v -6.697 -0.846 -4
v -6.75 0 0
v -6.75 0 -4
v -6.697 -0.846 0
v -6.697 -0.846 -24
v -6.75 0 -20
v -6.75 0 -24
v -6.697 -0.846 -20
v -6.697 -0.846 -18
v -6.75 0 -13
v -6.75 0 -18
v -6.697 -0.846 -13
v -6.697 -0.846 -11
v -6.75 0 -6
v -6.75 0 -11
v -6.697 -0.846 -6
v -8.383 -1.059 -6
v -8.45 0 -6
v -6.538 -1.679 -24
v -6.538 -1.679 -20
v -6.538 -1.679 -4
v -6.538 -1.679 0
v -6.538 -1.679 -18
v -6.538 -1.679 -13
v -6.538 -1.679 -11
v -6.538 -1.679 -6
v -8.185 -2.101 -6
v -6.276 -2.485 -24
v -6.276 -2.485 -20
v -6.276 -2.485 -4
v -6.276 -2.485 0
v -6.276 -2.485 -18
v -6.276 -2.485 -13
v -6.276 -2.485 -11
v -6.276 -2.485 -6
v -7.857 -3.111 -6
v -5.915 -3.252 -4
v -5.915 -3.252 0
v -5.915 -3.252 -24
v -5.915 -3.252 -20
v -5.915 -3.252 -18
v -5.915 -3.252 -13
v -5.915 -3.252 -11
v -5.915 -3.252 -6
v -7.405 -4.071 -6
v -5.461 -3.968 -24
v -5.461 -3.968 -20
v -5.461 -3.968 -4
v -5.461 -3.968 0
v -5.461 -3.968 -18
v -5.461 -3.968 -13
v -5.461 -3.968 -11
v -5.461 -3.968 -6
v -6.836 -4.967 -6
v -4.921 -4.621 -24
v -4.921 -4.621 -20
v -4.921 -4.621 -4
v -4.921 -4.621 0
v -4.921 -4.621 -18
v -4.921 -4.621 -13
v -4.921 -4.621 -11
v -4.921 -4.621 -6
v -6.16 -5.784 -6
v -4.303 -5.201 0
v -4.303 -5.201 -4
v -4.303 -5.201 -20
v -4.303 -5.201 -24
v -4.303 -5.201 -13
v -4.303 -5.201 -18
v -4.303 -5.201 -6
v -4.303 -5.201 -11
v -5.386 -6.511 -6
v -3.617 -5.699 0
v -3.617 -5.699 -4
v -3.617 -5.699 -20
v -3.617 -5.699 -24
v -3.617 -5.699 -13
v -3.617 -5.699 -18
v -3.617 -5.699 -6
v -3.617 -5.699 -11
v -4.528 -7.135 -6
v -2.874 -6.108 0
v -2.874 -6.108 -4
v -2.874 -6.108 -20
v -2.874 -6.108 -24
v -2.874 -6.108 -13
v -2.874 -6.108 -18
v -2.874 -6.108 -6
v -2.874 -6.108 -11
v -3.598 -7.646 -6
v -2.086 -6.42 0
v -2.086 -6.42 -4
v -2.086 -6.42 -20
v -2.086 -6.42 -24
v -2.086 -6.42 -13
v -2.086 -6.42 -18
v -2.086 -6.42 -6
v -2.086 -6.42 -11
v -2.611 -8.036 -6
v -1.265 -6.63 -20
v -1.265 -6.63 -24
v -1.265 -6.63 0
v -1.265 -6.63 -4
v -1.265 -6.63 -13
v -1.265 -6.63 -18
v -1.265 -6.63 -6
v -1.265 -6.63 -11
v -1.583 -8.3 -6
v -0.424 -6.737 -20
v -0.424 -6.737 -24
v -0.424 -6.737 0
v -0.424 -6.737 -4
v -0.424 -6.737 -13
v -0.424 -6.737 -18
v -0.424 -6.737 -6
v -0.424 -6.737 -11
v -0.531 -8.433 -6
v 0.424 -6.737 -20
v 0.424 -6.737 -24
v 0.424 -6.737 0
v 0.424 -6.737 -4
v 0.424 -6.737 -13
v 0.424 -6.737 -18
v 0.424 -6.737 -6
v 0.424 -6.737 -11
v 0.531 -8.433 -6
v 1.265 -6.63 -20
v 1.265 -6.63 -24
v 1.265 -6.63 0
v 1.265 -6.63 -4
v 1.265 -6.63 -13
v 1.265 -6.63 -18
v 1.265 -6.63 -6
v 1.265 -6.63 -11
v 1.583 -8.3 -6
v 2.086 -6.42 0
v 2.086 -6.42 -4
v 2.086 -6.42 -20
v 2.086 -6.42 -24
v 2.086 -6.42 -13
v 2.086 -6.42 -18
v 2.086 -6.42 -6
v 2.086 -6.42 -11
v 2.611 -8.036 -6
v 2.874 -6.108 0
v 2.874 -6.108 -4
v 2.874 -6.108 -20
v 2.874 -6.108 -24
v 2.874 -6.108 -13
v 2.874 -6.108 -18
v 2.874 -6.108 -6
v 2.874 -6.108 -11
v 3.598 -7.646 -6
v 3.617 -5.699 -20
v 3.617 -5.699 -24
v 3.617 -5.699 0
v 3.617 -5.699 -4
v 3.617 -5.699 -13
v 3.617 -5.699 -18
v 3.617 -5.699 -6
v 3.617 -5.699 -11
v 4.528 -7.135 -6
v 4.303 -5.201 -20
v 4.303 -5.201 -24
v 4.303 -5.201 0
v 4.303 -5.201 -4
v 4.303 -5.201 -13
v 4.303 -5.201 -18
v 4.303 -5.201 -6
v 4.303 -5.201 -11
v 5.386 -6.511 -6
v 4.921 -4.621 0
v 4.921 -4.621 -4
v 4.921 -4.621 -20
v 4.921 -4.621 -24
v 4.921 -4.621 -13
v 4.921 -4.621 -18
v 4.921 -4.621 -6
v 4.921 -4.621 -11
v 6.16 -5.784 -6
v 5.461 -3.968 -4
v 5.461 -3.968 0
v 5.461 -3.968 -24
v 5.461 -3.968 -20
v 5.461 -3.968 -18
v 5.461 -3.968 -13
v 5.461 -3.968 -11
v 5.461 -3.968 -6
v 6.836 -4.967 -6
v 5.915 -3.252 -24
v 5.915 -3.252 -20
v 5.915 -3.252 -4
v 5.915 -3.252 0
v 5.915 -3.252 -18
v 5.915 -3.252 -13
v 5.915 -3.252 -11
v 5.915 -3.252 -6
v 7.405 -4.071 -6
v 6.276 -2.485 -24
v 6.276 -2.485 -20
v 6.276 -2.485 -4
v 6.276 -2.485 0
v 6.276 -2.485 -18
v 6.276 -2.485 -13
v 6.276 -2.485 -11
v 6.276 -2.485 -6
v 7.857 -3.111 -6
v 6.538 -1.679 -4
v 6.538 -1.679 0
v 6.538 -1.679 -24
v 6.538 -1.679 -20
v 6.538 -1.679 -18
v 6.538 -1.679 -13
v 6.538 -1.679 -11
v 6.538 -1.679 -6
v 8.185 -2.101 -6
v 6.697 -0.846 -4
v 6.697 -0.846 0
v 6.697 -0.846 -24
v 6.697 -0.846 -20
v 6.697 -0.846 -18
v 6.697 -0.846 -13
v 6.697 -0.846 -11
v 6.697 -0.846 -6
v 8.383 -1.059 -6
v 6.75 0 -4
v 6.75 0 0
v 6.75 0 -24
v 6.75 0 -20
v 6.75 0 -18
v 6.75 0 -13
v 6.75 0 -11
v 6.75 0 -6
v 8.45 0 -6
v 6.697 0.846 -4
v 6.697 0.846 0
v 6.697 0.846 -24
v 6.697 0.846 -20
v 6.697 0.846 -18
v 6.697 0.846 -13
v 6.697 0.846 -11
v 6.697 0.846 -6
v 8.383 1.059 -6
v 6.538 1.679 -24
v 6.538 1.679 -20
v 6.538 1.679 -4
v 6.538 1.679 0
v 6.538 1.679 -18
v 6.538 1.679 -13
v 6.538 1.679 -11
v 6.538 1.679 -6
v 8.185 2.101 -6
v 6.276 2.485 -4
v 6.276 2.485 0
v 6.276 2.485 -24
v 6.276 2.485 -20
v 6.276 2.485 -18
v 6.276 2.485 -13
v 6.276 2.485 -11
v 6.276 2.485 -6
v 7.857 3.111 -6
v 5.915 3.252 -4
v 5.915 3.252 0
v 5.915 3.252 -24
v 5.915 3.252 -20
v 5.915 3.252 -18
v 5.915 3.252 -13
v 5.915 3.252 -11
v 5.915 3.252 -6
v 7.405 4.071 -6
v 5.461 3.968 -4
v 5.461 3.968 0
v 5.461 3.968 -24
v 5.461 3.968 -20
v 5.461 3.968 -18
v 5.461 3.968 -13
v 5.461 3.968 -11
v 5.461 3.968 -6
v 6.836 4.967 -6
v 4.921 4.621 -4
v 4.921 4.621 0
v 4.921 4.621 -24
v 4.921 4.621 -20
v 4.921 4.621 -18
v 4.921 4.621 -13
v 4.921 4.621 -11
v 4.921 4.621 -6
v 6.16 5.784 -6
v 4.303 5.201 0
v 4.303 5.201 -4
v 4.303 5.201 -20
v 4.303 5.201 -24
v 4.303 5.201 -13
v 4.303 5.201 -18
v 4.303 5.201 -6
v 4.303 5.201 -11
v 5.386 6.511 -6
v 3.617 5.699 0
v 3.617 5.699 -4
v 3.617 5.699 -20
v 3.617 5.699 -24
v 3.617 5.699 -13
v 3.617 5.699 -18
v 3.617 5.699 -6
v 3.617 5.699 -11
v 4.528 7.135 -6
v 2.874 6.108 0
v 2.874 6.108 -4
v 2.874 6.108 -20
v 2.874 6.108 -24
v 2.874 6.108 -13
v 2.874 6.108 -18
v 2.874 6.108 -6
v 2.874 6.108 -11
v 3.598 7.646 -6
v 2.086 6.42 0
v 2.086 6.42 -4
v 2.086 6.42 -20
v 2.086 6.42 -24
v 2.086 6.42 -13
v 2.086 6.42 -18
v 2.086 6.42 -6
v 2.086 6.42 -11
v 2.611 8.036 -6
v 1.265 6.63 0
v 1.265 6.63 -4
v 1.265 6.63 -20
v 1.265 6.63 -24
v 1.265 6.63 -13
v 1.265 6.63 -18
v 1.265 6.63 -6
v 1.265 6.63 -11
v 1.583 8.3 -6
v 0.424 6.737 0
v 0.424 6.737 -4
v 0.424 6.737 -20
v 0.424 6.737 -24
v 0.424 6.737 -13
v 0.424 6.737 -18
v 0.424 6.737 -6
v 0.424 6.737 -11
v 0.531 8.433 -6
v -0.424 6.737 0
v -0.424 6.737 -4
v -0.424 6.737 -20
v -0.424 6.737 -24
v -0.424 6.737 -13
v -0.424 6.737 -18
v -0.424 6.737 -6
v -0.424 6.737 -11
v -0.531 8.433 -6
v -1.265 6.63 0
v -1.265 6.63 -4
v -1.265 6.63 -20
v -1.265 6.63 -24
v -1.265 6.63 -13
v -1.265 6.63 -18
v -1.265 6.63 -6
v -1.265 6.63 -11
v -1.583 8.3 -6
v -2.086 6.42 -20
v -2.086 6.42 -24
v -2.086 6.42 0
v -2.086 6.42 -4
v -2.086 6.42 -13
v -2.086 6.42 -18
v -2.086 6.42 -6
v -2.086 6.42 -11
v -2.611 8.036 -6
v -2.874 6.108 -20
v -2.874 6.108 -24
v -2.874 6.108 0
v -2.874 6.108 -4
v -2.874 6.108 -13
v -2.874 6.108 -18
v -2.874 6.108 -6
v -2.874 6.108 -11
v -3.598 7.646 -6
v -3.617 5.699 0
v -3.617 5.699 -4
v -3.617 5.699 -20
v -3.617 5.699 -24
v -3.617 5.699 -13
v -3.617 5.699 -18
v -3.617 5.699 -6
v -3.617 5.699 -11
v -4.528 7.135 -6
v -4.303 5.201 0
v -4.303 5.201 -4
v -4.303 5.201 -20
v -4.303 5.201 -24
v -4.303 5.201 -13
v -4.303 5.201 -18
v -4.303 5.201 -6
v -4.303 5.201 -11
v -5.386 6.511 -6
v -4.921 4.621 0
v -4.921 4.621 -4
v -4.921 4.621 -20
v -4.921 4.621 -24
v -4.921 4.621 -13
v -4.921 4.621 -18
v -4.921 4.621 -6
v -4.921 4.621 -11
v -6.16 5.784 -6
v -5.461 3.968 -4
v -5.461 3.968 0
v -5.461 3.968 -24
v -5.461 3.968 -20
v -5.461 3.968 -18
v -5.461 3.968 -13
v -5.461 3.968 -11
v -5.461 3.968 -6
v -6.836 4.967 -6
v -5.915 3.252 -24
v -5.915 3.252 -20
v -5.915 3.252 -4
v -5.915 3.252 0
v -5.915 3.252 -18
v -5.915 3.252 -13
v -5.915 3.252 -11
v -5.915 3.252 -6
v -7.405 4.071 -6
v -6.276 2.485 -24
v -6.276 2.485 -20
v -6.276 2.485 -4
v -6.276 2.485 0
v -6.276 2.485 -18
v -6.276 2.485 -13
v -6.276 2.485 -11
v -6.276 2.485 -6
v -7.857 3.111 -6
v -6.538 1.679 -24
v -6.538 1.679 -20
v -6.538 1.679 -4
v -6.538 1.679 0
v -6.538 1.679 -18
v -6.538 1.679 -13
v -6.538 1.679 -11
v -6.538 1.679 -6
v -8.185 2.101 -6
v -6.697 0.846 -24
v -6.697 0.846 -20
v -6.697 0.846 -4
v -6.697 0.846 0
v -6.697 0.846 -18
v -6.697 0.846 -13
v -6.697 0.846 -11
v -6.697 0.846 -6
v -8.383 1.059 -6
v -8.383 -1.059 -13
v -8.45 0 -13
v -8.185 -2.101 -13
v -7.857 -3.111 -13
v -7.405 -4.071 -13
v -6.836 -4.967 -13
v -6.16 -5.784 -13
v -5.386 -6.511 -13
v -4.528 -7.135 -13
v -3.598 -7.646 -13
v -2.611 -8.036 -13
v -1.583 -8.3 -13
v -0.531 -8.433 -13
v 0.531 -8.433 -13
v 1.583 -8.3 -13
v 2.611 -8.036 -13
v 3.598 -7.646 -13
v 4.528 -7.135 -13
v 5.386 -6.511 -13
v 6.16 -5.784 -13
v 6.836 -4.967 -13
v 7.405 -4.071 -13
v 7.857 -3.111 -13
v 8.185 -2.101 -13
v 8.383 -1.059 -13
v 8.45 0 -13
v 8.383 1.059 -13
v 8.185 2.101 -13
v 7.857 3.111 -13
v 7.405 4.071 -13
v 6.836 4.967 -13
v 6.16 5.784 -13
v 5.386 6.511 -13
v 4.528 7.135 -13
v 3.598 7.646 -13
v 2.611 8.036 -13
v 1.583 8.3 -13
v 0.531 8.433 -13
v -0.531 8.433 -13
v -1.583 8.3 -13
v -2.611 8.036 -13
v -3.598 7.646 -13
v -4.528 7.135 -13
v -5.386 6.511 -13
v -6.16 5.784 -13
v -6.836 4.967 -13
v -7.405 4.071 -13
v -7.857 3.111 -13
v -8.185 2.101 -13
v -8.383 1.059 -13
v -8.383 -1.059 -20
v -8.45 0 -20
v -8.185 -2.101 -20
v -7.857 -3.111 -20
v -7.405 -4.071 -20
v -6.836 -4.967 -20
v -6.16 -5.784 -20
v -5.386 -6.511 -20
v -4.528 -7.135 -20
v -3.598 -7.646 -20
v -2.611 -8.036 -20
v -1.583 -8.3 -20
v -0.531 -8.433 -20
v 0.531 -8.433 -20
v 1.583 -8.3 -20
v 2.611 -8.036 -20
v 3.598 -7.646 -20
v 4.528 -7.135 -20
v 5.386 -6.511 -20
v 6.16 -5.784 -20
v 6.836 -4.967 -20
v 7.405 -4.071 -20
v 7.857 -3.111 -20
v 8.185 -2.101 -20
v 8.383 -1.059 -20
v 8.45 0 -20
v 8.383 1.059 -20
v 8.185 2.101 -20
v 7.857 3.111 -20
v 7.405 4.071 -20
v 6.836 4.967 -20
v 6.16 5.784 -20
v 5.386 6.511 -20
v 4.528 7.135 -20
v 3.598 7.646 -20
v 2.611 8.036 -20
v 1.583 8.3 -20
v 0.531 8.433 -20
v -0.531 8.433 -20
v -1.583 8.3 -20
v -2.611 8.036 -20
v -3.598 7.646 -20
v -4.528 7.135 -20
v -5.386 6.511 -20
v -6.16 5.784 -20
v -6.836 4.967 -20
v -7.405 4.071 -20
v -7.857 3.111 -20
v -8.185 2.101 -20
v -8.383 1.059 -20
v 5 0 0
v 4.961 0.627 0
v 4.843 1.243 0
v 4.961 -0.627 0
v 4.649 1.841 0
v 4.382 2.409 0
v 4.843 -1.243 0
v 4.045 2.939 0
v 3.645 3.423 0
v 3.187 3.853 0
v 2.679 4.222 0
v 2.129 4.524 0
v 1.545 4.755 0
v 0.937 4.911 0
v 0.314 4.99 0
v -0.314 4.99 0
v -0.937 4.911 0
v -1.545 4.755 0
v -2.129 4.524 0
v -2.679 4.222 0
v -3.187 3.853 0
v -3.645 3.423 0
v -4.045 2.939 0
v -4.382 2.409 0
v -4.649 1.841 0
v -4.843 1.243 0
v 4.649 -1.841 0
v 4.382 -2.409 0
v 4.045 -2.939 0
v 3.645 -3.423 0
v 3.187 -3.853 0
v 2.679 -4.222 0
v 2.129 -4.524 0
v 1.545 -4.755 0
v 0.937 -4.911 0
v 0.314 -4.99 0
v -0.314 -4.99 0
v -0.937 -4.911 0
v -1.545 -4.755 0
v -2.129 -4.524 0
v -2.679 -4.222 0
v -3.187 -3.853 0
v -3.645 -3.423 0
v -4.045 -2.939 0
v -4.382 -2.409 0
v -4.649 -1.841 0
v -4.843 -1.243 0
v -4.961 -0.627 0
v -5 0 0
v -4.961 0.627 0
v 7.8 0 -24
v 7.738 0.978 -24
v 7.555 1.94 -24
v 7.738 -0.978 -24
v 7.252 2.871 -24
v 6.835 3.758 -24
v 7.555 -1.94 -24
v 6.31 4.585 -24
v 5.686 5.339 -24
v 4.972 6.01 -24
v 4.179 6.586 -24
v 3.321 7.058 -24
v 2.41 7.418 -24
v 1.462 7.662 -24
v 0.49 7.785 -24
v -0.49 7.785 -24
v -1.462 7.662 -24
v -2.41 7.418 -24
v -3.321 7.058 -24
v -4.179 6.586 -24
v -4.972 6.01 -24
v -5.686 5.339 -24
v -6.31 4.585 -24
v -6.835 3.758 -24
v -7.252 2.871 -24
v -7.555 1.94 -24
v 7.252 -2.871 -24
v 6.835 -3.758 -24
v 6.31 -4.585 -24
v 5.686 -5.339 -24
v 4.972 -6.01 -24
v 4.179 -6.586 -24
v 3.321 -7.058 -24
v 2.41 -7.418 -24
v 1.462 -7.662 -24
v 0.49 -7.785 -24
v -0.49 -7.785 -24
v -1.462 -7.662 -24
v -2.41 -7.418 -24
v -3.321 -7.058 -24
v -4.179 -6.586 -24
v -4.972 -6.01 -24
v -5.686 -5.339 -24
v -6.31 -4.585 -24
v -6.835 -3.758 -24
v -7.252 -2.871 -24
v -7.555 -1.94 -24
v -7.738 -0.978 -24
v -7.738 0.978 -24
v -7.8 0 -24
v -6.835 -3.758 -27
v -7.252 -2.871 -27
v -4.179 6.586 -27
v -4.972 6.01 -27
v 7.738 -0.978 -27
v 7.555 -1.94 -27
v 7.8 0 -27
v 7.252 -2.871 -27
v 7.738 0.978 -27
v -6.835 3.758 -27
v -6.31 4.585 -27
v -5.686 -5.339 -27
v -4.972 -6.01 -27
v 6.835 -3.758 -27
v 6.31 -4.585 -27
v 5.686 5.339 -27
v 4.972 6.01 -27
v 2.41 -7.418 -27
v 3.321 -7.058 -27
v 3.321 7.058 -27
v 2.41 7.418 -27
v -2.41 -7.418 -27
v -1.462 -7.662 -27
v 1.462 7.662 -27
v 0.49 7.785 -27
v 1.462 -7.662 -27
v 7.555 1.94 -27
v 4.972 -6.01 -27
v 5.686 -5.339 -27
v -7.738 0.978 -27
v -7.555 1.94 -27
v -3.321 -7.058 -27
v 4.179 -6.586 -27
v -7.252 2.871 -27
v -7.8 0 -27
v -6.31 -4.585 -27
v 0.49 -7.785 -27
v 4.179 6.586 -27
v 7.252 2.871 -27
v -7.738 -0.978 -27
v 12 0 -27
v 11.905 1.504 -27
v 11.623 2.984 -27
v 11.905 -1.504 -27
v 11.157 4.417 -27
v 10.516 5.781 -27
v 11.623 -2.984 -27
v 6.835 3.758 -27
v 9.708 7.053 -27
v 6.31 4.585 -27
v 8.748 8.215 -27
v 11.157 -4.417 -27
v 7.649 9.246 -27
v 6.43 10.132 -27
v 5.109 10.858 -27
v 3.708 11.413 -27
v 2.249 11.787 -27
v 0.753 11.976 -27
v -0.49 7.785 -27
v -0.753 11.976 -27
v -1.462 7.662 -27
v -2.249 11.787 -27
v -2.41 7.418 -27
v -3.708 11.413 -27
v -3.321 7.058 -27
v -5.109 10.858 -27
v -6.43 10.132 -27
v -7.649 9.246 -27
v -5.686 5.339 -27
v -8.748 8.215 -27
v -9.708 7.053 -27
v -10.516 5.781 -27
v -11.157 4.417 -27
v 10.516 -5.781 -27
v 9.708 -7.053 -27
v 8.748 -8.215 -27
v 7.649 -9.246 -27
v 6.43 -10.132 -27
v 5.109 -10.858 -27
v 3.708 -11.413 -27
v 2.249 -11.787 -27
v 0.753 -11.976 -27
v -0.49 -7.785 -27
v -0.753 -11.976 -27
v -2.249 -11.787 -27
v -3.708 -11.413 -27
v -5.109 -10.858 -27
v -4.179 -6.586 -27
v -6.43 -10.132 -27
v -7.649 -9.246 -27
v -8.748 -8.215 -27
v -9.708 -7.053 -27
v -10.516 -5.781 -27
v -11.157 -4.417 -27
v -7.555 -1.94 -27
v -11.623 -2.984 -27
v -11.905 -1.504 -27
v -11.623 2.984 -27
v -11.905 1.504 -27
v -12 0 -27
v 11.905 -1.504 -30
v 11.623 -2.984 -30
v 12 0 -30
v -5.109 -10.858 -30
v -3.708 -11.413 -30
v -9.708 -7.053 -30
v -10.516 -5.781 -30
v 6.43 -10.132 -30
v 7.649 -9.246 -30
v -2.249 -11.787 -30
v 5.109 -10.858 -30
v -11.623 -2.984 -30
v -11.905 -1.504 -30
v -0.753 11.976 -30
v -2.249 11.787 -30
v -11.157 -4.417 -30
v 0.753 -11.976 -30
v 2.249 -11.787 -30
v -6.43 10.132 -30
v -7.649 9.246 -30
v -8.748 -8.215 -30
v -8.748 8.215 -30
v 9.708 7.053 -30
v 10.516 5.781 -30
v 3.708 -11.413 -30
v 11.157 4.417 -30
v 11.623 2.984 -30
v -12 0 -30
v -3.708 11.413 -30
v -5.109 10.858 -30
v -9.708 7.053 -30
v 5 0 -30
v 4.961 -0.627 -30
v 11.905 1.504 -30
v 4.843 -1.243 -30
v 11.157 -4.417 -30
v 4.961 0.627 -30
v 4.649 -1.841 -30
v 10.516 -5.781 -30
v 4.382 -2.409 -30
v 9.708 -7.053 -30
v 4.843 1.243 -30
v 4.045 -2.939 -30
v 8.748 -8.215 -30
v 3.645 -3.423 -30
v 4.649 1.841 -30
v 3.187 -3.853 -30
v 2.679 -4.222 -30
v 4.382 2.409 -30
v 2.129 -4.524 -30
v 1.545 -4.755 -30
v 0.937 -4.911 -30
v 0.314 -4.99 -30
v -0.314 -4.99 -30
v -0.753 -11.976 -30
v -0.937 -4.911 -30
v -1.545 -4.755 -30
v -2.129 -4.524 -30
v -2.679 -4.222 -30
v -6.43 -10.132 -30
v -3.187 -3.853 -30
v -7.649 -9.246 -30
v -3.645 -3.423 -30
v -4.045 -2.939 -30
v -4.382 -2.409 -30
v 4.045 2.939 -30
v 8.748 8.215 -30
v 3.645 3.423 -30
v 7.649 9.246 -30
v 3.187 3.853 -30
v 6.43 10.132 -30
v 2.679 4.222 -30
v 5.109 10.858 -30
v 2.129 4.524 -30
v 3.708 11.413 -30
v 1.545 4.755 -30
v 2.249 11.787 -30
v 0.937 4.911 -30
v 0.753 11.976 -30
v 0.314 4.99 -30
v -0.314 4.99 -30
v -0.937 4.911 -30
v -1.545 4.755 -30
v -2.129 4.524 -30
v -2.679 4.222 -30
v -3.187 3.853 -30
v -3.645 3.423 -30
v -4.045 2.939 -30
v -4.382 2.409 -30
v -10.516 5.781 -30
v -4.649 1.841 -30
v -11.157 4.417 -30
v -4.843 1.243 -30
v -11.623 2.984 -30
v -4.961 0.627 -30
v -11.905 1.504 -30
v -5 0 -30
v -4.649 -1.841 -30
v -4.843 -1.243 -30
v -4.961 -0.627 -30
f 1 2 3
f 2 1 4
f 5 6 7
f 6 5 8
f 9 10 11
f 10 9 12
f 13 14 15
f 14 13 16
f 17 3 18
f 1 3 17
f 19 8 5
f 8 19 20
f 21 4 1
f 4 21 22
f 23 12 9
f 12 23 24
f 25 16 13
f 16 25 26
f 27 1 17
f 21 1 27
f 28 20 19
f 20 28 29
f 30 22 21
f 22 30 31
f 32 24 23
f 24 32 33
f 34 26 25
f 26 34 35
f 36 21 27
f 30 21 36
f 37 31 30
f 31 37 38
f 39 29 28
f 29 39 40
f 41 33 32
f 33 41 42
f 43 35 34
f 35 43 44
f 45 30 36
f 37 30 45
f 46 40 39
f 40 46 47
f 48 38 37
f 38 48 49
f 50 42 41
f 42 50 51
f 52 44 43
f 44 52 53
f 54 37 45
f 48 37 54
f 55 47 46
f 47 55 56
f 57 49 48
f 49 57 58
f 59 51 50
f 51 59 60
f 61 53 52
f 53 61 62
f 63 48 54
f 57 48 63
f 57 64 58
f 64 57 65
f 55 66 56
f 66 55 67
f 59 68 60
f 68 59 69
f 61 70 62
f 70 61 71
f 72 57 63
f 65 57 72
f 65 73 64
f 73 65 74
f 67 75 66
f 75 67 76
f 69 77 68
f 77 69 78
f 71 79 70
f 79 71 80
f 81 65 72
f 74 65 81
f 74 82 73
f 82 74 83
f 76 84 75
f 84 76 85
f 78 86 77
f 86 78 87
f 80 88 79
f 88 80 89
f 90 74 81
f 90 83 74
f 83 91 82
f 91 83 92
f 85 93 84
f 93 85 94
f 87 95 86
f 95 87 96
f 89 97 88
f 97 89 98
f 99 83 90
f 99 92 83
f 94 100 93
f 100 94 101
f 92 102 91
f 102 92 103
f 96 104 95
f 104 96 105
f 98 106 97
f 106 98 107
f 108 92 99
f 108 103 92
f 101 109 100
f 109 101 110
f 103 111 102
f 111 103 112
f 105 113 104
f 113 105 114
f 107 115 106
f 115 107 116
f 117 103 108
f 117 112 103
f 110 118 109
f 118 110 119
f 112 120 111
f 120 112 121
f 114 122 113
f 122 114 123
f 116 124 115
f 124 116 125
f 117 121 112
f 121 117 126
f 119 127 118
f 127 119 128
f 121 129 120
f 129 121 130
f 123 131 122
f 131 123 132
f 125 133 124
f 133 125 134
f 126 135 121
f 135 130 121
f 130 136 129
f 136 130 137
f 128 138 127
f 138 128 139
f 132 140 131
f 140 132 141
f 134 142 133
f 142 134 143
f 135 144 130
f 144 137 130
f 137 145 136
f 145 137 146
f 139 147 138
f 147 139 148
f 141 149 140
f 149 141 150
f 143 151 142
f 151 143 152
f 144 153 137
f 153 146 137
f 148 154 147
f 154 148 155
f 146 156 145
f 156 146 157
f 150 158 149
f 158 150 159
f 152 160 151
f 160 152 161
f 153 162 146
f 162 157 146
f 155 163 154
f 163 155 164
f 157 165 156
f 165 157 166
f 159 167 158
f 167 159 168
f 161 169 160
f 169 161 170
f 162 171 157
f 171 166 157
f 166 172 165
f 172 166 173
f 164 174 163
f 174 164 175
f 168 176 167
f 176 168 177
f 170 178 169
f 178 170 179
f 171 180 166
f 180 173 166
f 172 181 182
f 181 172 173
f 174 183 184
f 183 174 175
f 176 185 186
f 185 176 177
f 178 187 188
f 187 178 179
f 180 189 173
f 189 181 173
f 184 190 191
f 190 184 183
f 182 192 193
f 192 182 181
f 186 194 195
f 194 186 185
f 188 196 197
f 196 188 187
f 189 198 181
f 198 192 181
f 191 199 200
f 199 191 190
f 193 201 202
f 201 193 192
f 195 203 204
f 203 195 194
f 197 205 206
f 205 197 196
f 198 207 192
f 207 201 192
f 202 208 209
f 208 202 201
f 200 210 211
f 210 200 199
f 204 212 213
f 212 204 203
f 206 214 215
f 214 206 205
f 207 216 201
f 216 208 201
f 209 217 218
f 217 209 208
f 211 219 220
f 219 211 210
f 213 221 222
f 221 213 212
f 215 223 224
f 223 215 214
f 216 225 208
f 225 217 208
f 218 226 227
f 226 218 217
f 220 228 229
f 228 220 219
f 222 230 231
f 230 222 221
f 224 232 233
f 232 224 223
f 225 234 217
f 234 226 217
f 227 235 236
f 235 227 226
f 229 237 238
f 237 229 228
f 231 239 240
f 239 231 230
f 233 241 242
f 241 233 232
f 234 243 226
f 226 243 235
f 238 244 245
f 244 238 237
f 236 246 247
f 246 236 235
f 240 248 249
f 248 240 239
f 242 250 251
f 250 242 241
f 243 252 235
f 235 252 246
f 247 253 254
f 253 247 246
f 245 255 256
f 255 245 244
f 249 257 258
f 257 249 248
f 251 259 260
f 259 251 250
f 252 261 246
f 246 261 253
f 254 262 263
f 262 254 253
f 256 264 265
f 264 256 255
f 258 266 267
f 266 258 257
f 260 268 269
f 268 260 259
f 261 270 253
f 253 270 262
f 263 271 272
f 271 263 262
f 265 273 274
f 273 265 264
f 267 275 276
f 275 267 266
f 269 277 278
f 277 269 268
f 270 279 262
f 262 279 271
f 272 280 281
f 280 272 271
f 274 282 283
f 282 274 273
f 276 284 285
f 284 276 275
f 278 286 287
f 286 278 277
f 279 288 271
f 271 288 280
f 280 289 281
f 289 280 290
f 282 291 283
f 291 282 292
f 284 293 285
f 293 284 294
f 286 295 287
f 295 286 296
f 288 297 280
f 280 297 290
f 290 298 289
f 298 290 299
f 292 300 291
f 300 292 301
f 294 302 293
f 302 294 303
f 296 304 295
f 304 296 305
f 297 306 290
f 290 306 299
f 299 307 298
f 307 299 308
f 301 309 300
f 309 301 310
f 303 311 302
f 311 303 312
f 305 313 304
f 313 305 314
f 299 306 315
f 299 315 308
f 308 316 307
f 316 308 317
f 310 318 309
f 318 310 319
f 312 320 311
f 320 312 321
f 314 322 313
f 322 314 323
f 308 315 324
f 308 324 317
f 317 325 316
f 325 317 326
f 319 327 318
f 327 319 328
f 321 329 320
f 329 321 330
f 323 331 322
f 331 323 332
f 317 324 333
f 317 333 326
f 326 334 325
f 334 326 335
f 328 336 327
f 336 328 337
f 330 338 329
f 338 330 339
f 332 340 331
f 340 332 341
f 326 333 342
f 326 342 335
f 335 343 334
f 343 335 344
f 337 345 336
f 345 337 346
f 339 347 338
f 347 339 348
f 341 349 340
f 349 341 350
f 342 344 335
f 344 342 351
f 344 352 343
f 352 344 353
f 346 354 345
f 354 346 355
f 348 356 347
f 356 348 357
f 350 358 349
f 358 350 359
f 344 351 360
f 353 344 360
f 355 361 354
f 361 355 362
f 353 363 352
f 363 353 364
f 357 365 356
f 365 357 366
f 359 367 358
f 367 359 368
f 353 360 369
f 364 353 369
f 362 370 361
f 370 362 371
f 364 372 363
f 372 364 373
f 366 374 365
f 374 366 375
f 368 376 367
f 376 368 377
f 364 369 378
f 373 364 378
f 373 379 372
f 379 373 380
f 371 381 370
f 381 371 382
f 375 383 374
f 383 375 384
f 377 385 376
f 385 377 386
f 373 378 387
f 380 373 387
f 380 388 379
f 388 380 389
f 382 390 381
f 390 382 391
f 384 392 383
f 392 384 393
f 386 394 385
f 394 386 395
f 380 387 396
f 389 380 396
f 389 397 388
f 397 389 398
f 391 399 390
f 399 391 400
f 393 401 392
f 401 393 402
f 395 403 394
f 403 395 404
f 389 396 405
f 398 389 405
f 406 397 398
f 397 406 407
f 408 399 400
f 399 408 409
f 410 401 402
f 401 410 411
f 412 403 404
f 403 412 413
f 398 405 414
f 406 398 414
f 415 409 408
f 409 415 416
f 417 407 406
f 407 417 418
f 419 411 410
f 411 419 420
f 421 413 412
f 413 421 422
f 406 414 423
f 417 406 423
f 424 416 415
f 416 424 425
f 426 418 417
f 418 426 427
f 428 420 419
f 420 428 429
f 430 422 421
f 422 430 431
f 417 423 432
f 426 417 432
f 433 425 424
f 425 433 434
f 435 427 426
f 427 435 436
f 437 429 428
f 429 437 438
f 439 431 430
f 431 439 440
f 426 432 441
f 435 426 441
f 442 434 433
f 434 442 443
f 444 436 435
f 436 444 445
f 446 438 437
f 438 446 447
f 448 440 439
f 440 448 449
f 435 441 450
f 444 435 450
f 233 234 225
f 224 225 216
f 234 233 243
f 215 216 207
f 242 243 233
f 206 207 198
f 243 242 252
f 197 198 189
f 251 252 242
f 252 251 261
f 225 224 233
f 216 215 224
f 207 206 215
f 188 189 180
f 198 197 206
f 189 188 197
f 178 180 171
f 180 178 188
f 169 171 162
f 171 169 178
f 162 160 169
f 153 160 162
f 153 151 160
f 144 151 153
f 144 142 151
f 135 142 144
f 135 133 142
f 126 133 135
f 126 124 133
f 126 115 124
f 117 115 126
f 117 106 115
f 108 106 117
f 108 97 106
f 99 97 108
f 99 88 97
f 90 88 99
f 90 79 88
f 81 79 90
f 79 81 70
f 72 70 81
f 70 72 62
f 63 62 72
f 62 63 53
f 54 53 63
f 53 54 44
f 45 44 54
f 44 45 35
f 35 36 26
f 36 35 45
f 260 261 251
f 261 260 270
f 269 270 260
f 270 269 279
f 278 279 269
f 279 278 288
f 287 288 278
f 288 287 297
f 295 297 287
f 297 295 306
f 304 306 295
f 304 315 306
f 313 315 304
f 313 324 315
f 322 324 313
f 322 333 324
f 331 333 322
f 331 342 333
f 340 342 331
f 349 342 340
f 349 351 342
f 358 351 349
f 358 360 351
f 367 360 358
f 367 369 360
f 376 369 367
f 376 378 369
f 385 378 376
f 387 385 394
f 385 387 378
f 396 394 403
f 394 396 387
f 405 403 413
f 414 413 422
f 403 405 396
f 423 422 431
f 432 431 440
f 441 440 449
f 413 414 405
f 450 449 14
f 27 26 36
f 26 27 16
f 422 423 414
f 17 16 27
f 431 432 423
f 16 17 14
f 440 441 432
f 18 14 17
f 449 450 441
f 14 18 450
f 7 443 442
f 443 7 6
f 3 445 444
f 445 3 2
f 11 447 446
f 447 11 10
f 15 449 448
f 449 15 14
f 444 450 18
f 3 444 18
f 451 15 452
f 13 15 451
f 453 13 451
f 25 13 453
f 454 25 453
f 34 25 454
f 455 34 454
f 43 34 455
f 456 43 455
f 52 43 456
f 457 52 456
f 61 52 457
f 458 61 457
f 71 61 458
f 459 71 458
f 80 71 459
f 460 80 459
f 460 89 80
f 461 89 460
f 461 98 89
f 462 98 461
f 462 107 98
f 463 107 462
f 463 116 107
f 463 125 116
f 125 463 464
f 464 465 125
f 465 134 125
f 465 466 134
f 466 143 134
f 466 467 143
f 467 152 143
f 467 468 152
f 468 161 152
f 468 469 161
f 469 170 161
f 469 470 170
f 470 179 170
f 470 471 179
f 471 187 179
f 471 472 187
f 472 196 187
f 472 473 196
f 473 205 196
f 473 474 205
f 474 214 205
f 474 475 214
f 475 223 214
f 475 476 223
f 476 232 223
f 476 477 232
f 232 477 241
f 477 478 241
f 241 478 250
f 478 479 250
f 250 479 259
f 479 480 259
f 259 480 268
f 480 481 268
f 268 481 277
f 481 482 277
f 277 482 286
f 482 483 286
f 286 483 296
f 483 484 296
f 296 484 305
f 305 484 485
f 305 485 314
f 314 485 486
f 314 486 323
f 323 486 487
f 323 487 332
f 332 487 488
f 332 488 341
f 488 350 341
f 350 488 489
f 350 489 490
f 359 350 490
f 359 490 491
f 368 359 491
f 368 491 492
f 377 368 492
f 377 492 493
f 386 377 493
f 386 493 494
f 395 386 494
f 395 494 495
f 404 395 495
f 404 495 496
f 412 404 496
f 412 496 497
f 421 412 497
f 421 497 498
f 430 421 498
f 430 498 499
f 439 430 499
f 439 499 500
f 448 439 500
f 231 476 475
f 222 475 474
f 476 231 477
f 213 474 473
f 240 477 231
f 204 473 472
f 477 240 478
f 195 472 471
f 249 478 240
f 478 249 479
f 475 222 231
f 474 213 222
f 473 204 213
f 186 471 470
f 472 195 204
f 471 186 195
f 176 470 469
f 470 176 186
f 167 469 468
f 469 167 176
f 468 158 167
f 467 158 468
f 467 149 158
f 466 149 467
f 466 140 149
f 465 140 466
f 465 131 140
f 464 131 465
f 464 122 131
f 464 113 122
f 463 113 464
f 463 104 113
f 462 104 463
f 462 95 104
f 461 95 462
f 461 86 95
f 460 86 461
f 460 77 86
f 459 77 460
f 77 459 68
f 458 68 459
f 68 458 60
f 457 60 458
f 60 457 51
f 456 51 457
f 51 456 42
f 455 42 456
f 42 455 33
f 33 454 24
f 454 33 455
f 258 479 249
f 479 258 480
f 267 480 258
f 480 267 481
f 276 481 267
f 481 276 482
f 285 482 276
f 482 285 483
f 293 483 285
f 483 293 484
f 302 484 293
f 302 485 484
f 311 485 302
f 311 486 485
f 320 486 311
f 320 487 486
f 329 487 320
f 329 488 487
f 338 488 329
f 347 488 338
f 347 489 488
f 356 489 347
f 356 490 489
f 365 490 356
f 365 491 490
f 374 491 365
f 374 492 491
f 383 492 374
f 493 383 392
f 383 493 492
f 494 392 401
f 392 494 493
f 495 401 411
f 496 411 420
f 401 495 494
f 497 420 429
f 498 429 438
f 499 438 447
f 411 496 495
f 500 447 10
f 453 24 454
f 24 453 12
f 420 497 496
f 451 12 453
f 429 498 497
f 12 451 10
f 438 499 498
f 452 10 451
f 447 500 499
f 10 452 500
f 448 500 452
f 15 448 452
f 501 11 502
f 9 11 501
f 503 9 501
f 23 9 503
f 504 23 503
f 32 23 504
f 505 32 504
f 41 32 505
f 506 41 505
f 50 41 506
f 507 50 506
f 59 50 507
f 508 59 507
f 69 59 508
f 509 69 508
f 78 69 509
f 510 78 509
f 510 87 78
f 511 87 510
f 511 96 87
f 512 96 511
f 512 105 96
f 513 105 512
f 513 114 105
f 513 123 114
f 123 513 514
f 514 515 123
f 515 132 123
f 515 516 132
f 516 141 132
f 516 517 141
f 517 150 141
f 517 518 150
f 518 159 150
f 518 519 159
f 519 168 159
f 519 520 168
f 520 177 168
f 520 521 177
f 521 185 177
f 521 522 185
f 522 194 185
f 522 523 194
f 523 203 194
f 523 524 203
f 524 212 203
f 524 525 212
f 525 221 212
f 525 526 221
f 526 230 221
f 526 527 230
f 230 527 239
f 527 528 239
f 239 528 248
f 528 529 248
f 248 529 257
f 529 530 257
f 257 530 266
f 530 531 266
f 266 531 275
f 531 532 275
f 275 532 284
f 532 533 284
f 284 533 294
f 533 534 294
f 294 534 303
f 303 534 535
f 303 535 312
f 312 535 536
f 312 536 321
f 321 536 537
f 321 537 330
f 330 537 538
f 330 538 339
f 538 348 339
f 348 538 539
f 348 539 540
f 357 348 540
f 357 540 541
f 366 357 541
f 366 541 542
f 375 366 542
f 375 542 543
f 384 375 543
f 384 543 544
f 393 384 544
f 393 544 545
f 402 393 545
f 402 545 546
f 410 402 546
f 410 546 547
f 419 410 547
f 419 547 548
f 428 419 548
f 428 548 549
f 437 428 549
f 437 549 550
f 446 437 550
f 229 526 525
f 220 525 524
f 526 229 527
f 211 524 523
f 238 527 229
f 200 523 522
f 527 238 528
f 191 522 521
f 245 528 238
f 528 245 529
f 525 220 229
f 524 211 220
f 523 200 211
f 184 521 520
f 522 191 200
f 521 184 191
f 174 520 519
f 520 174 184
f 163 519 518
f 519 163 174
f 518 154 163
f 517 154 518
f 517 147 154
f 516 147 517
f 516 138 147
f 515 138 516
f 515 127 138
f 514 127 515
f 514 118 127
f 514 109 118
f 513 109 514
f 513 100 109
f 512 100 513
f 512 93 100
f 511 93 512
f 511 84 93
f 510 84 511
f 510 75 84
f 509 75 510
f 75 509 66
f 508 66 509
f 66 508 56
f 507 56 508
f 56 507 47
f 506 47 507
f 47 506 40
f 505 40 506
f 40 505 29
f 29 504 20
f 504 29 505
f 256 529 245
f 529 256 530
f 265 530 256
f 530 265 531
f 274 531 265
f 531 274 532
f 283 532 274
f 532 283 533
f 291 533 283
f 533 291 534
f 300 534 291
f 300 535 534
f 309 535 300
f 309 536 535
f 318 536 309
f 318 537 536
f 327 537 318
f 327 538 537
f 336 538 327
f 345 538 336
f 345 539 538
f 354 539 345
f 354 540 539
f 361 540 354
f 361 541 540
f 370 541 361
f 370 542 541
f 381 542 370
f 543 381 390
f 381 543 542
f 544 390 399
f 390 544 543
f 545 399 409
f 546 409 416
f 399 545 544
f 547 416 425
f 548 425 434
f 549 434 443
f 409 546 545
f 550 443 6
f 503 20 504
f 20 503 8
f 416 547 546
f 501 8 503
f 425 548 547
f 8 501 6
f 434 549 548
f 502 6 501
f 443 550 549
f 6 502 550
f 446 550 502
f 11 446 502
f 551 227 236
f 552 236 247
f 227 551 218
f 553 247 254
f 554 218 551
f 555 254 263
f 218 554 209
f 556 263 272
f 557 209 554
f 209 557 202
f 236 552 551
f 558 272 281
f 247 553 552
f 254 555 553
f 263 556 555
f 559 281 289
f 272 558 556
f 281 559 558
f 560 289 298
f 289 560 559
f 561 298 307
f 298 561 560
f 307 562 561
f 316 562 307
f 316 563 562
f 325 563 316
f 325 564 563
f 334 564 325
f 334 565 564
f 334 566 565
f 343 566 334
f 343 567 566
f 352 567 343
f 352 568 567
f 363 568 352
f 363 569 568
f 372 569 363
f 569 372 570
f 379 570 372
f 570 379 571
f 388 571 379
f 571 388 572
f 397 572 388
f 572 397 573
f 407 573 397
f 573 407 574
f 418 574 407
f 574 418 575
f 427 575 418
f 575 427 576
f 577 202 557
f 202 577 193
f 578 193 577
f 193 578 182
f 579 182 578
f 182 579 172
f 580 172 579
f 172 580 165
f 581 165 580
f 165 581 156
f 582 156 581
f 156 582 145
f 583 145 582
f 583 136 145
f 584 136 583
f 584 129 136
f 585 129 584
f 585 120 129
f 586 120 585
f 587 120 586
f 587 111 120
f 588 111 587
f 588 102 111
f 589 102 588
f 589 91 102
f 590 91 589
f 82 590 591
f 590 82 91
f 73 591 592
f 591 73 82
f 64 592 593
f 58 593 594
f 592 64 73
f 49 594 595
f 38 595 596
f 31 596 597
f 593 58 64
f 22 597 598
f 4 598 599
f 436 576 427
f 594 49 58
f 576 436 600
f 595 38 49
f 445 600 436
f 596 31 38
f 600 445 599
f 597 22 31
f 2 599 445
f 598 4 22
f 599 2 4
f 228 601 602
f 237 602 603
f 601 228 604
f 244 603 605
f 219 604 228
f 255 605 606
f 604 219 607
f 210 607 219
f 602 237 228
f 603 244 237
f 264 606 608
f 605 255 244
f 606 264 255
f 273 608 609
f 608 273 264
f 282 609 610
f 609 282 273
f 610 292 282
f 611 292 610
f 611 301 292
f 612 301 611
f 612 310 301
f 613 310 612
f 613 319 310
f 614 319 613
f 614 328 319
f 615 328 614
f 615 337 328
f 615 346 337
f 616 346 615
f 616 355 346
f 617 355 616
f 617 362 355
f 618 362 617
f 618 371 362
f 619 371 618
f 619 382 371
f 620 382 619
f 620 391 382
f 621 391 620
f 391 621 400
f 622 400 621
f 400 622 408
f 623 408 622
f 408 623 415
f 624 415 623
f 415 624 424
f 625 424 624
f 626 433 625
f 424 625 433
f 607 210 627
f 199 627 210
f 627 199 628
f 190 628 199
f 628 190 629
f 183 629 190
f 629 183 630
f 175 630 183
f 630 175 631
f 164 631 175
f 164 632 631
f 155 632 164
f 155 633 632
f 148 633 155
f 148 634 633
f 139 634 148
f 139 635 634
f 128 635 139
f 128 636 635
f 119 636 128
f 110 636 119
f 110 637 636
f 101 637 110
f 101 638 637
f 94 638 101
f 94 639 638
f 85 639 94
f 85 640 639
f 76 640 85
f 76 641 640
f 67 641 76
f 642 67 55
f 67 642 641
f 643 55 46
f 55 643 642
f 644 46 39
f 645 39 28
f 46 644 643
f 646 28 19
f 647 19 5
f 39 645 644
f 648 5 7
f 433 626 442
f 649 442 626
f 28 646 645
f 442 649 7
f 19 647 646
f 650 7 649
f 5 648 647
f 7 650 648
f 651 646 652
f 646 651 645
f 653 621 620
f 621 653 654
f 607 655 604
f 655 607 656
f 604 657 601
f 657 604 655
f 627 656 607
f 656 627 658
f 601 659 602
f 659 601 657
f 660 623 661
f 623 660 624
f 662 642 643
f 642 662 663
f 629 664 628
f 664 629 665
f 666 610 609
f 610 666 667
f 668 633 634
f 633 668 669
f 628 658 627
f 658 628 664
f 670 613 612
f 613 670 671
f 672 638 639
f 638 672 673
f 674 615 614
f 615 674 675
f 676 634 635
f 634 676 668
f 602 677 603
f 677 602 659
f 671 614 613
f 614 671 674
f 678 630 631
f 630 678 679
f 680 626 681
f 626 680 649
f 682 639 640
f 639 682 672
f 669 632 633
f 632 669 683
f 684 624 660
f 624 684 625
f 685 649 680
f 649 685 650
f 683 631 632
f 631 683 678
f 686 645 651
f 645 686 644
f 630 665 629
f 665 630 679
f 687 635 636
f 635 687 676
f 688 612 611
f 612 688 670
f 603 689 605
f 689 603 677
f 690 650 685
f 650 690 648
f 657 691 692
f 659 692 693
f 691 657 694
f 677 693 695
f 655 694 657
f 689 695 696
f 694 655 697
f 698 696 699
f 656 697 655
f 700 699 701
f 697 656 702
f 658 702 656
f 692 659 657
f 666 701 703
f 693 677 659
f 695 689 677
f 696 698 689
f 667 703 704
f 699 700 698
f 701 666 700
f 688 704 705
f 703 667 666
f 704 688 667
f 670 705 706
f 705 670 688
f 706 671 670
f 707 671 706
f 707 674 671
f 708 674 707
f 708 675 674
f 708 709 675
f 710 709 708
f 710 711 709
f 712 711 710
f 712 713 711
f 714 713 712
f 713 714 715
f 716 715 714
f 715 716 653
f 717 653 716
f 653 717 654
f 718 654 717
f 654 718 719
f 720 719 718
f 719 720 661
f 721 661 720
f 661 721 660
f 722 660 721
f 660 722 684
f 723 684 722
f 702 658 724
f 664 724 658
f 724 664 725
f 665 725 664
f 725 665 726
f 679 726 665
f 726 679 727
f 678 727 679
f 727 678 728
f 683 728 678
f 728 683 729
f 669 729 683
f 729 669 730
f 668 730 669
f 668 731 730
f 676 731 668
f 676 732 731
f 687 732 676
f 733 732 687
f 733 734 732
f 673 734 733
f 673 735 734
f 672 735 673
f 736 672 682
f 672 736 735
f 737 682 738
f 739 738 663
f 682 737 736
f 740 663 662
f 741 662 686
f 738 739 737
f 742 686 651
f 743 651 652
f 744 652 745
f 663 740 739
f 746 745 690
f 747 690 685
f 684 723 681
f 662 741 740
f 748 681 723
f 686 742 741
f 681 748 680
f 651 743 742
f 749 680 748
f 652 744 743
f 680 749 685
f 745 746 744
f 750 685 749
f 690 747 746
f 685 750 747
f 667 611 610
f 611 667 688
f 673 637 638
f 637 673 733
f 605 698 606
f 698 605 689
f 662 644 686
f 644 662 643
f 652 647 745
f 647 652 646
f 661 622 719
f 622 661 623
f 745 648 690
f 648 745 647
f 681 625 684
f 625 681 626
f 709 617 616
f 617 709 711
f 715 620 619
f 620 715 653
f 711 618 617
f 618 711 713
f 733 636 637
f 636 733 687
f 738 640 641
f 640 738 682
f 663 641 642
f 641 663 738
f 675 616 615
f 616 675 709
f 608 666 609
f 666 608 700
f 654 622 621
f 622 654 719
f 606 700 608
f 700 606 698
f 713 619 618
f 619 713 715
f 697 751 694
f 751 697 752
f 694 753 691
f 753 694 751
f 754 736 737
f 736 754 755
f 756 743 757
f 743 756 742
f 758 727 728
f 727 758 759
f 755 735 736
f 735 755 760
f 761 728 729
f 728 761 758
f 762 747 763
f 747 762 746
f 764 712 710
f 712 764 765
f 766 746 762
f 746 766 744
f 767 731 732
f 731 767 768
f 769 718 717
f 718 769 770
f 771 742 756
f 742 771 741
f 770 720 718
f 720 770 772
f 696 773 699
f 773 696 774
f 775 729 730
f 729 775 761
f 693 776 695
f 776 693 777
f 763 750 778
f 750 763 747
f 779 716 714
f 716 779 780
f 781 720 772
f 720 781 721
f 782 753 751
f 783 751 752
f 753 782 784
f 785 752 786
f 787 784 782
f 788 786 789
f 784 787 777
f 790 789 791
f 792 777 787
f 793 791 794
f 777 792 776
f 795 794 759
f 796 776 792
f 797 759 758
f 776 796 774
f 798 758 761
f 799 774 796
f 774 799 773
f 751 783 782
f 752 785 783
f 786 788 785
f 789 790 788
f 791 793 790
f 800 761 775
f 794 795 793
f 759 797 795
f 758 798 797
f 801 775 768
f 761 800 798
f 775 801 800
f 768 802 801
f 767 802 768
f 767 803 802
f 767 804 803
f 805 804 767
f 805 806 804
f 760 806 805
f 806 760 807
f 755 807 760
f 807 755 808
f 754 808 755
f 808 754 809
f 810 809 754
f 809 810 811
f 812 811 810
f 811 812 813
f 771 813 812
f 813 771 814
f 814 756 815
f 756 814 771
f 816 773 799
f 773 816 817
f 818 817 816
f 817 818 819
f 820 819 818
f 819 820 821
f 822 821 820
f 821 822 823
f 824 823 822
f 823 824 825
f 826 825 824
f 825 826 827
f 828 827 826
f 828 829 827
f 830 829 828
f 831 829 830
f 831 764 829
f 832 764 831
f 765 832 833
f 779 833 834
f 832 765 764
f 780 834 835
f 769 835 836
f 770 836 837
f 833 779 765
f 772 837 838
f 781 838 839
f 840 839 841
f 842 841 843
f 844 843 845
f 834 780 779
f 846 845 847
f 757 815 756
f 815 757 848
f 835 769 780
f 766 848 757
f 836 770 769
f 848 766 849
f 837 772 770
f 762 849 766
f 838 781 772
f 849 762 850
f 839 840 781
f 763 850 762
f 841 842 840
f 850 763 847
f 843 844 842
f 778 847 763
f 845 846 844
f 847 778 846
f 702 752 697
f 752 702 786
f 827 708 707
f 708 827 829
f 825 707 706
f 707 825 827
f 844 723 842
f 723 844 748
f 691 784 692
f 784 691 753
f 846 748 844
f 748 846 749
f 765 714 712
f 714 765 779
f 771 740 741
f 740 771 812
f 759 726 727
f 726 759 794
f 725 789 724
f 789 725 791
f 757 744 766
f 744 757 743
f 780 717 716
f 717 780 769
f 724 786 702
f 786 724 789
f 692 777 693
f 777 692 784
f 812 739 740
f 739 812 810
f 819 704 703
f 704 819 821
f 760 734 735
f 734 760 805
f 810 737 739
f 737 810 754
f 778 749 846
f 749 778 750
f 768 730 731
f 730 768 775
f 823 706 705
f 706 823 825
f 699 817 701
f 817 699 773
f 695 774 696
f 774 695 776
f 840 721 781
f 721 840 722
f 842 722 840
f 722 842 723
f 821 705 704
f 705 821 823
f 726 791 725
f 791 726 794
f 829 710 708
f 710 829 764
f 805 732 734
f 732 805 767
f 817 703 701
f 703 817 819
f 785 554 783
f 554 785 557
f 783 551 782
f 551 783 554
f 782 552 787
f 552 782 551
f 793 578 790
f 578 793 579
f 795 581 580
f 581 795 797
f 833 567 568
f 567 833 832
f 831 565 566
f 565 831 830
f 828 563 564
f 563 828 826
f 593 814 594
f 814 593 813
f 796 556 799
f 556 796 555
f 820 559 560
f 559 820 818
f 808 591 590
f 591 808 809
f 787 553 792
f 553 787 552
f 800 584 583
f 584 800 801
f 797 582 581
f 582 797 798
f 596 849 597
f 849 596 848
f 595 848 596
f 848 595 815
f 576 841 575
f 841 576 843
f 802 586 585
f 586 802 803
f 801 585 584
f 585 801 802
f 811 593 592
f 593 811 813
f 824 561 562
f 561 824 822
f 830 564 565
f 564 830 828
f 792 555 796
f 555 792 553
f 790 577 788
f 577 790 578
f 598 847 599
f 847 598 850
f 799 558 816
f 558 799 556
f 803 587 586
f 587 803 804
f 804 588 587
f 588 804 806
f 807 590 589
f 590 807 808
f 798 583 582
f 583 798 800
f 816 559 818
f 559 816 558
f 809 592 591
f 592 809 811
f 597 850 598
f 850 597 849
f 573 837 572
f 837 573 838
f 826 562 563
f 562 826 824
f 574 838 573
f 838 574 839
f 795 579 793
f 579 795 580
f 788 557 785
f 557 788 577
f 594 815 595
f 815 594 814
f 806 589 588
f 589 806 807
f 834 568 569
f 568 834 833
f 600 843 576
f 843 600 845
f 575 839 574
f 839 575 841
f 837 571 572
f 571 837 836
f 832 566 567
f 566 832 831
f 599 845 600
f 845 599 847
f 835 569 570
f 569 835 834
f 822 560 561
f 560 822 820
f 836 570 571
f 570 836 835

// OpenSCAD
d_in = 10;
d_out = 13.5;

cap1_d = 15.6;
cap1_height = 3;

cap2_d = 24;
cap2_height = 3;

height = 24;

$fn = 50;

rings_begin = 4;
number_rings = 3;
interval_rings = 7;

height_ring = 2;
depth_ring = 1.7;

rotate([180, 0, 0])
difference() {
    union() {
        cylinder(r1=d_out/2, r2=d_out/2, h=height);

        translate([0, 0, height])
        cylinder(r1=cap1_d/2, r2=cap1_d/2, h=cap1_height);
    
        translate([0, 0, height + cap1_height])
        cylinder(r1=cap2_d/2, r2=cap2_d/2, h=cap2_height);
    
        translate([0, 0, rings_begin])
        rings();
    };
    cylinder(r1=d_in/2, r2=d_in/2, h=height+cap1_height+cap2_height);
};

module rings() {
    for(i = [0, 1, number_rings-1]) {
        translate([0, 0, i*interval_rings])
        ring();
    };
};


module ring() {
    translate([0, 0, height_ring])
    rotate_extrude(angle = 360)
    translate([d_out/2, 0, 0])
    polygon(points=[[0, 0], [depth_ring, 0], [0, -height_ring]]);
};
